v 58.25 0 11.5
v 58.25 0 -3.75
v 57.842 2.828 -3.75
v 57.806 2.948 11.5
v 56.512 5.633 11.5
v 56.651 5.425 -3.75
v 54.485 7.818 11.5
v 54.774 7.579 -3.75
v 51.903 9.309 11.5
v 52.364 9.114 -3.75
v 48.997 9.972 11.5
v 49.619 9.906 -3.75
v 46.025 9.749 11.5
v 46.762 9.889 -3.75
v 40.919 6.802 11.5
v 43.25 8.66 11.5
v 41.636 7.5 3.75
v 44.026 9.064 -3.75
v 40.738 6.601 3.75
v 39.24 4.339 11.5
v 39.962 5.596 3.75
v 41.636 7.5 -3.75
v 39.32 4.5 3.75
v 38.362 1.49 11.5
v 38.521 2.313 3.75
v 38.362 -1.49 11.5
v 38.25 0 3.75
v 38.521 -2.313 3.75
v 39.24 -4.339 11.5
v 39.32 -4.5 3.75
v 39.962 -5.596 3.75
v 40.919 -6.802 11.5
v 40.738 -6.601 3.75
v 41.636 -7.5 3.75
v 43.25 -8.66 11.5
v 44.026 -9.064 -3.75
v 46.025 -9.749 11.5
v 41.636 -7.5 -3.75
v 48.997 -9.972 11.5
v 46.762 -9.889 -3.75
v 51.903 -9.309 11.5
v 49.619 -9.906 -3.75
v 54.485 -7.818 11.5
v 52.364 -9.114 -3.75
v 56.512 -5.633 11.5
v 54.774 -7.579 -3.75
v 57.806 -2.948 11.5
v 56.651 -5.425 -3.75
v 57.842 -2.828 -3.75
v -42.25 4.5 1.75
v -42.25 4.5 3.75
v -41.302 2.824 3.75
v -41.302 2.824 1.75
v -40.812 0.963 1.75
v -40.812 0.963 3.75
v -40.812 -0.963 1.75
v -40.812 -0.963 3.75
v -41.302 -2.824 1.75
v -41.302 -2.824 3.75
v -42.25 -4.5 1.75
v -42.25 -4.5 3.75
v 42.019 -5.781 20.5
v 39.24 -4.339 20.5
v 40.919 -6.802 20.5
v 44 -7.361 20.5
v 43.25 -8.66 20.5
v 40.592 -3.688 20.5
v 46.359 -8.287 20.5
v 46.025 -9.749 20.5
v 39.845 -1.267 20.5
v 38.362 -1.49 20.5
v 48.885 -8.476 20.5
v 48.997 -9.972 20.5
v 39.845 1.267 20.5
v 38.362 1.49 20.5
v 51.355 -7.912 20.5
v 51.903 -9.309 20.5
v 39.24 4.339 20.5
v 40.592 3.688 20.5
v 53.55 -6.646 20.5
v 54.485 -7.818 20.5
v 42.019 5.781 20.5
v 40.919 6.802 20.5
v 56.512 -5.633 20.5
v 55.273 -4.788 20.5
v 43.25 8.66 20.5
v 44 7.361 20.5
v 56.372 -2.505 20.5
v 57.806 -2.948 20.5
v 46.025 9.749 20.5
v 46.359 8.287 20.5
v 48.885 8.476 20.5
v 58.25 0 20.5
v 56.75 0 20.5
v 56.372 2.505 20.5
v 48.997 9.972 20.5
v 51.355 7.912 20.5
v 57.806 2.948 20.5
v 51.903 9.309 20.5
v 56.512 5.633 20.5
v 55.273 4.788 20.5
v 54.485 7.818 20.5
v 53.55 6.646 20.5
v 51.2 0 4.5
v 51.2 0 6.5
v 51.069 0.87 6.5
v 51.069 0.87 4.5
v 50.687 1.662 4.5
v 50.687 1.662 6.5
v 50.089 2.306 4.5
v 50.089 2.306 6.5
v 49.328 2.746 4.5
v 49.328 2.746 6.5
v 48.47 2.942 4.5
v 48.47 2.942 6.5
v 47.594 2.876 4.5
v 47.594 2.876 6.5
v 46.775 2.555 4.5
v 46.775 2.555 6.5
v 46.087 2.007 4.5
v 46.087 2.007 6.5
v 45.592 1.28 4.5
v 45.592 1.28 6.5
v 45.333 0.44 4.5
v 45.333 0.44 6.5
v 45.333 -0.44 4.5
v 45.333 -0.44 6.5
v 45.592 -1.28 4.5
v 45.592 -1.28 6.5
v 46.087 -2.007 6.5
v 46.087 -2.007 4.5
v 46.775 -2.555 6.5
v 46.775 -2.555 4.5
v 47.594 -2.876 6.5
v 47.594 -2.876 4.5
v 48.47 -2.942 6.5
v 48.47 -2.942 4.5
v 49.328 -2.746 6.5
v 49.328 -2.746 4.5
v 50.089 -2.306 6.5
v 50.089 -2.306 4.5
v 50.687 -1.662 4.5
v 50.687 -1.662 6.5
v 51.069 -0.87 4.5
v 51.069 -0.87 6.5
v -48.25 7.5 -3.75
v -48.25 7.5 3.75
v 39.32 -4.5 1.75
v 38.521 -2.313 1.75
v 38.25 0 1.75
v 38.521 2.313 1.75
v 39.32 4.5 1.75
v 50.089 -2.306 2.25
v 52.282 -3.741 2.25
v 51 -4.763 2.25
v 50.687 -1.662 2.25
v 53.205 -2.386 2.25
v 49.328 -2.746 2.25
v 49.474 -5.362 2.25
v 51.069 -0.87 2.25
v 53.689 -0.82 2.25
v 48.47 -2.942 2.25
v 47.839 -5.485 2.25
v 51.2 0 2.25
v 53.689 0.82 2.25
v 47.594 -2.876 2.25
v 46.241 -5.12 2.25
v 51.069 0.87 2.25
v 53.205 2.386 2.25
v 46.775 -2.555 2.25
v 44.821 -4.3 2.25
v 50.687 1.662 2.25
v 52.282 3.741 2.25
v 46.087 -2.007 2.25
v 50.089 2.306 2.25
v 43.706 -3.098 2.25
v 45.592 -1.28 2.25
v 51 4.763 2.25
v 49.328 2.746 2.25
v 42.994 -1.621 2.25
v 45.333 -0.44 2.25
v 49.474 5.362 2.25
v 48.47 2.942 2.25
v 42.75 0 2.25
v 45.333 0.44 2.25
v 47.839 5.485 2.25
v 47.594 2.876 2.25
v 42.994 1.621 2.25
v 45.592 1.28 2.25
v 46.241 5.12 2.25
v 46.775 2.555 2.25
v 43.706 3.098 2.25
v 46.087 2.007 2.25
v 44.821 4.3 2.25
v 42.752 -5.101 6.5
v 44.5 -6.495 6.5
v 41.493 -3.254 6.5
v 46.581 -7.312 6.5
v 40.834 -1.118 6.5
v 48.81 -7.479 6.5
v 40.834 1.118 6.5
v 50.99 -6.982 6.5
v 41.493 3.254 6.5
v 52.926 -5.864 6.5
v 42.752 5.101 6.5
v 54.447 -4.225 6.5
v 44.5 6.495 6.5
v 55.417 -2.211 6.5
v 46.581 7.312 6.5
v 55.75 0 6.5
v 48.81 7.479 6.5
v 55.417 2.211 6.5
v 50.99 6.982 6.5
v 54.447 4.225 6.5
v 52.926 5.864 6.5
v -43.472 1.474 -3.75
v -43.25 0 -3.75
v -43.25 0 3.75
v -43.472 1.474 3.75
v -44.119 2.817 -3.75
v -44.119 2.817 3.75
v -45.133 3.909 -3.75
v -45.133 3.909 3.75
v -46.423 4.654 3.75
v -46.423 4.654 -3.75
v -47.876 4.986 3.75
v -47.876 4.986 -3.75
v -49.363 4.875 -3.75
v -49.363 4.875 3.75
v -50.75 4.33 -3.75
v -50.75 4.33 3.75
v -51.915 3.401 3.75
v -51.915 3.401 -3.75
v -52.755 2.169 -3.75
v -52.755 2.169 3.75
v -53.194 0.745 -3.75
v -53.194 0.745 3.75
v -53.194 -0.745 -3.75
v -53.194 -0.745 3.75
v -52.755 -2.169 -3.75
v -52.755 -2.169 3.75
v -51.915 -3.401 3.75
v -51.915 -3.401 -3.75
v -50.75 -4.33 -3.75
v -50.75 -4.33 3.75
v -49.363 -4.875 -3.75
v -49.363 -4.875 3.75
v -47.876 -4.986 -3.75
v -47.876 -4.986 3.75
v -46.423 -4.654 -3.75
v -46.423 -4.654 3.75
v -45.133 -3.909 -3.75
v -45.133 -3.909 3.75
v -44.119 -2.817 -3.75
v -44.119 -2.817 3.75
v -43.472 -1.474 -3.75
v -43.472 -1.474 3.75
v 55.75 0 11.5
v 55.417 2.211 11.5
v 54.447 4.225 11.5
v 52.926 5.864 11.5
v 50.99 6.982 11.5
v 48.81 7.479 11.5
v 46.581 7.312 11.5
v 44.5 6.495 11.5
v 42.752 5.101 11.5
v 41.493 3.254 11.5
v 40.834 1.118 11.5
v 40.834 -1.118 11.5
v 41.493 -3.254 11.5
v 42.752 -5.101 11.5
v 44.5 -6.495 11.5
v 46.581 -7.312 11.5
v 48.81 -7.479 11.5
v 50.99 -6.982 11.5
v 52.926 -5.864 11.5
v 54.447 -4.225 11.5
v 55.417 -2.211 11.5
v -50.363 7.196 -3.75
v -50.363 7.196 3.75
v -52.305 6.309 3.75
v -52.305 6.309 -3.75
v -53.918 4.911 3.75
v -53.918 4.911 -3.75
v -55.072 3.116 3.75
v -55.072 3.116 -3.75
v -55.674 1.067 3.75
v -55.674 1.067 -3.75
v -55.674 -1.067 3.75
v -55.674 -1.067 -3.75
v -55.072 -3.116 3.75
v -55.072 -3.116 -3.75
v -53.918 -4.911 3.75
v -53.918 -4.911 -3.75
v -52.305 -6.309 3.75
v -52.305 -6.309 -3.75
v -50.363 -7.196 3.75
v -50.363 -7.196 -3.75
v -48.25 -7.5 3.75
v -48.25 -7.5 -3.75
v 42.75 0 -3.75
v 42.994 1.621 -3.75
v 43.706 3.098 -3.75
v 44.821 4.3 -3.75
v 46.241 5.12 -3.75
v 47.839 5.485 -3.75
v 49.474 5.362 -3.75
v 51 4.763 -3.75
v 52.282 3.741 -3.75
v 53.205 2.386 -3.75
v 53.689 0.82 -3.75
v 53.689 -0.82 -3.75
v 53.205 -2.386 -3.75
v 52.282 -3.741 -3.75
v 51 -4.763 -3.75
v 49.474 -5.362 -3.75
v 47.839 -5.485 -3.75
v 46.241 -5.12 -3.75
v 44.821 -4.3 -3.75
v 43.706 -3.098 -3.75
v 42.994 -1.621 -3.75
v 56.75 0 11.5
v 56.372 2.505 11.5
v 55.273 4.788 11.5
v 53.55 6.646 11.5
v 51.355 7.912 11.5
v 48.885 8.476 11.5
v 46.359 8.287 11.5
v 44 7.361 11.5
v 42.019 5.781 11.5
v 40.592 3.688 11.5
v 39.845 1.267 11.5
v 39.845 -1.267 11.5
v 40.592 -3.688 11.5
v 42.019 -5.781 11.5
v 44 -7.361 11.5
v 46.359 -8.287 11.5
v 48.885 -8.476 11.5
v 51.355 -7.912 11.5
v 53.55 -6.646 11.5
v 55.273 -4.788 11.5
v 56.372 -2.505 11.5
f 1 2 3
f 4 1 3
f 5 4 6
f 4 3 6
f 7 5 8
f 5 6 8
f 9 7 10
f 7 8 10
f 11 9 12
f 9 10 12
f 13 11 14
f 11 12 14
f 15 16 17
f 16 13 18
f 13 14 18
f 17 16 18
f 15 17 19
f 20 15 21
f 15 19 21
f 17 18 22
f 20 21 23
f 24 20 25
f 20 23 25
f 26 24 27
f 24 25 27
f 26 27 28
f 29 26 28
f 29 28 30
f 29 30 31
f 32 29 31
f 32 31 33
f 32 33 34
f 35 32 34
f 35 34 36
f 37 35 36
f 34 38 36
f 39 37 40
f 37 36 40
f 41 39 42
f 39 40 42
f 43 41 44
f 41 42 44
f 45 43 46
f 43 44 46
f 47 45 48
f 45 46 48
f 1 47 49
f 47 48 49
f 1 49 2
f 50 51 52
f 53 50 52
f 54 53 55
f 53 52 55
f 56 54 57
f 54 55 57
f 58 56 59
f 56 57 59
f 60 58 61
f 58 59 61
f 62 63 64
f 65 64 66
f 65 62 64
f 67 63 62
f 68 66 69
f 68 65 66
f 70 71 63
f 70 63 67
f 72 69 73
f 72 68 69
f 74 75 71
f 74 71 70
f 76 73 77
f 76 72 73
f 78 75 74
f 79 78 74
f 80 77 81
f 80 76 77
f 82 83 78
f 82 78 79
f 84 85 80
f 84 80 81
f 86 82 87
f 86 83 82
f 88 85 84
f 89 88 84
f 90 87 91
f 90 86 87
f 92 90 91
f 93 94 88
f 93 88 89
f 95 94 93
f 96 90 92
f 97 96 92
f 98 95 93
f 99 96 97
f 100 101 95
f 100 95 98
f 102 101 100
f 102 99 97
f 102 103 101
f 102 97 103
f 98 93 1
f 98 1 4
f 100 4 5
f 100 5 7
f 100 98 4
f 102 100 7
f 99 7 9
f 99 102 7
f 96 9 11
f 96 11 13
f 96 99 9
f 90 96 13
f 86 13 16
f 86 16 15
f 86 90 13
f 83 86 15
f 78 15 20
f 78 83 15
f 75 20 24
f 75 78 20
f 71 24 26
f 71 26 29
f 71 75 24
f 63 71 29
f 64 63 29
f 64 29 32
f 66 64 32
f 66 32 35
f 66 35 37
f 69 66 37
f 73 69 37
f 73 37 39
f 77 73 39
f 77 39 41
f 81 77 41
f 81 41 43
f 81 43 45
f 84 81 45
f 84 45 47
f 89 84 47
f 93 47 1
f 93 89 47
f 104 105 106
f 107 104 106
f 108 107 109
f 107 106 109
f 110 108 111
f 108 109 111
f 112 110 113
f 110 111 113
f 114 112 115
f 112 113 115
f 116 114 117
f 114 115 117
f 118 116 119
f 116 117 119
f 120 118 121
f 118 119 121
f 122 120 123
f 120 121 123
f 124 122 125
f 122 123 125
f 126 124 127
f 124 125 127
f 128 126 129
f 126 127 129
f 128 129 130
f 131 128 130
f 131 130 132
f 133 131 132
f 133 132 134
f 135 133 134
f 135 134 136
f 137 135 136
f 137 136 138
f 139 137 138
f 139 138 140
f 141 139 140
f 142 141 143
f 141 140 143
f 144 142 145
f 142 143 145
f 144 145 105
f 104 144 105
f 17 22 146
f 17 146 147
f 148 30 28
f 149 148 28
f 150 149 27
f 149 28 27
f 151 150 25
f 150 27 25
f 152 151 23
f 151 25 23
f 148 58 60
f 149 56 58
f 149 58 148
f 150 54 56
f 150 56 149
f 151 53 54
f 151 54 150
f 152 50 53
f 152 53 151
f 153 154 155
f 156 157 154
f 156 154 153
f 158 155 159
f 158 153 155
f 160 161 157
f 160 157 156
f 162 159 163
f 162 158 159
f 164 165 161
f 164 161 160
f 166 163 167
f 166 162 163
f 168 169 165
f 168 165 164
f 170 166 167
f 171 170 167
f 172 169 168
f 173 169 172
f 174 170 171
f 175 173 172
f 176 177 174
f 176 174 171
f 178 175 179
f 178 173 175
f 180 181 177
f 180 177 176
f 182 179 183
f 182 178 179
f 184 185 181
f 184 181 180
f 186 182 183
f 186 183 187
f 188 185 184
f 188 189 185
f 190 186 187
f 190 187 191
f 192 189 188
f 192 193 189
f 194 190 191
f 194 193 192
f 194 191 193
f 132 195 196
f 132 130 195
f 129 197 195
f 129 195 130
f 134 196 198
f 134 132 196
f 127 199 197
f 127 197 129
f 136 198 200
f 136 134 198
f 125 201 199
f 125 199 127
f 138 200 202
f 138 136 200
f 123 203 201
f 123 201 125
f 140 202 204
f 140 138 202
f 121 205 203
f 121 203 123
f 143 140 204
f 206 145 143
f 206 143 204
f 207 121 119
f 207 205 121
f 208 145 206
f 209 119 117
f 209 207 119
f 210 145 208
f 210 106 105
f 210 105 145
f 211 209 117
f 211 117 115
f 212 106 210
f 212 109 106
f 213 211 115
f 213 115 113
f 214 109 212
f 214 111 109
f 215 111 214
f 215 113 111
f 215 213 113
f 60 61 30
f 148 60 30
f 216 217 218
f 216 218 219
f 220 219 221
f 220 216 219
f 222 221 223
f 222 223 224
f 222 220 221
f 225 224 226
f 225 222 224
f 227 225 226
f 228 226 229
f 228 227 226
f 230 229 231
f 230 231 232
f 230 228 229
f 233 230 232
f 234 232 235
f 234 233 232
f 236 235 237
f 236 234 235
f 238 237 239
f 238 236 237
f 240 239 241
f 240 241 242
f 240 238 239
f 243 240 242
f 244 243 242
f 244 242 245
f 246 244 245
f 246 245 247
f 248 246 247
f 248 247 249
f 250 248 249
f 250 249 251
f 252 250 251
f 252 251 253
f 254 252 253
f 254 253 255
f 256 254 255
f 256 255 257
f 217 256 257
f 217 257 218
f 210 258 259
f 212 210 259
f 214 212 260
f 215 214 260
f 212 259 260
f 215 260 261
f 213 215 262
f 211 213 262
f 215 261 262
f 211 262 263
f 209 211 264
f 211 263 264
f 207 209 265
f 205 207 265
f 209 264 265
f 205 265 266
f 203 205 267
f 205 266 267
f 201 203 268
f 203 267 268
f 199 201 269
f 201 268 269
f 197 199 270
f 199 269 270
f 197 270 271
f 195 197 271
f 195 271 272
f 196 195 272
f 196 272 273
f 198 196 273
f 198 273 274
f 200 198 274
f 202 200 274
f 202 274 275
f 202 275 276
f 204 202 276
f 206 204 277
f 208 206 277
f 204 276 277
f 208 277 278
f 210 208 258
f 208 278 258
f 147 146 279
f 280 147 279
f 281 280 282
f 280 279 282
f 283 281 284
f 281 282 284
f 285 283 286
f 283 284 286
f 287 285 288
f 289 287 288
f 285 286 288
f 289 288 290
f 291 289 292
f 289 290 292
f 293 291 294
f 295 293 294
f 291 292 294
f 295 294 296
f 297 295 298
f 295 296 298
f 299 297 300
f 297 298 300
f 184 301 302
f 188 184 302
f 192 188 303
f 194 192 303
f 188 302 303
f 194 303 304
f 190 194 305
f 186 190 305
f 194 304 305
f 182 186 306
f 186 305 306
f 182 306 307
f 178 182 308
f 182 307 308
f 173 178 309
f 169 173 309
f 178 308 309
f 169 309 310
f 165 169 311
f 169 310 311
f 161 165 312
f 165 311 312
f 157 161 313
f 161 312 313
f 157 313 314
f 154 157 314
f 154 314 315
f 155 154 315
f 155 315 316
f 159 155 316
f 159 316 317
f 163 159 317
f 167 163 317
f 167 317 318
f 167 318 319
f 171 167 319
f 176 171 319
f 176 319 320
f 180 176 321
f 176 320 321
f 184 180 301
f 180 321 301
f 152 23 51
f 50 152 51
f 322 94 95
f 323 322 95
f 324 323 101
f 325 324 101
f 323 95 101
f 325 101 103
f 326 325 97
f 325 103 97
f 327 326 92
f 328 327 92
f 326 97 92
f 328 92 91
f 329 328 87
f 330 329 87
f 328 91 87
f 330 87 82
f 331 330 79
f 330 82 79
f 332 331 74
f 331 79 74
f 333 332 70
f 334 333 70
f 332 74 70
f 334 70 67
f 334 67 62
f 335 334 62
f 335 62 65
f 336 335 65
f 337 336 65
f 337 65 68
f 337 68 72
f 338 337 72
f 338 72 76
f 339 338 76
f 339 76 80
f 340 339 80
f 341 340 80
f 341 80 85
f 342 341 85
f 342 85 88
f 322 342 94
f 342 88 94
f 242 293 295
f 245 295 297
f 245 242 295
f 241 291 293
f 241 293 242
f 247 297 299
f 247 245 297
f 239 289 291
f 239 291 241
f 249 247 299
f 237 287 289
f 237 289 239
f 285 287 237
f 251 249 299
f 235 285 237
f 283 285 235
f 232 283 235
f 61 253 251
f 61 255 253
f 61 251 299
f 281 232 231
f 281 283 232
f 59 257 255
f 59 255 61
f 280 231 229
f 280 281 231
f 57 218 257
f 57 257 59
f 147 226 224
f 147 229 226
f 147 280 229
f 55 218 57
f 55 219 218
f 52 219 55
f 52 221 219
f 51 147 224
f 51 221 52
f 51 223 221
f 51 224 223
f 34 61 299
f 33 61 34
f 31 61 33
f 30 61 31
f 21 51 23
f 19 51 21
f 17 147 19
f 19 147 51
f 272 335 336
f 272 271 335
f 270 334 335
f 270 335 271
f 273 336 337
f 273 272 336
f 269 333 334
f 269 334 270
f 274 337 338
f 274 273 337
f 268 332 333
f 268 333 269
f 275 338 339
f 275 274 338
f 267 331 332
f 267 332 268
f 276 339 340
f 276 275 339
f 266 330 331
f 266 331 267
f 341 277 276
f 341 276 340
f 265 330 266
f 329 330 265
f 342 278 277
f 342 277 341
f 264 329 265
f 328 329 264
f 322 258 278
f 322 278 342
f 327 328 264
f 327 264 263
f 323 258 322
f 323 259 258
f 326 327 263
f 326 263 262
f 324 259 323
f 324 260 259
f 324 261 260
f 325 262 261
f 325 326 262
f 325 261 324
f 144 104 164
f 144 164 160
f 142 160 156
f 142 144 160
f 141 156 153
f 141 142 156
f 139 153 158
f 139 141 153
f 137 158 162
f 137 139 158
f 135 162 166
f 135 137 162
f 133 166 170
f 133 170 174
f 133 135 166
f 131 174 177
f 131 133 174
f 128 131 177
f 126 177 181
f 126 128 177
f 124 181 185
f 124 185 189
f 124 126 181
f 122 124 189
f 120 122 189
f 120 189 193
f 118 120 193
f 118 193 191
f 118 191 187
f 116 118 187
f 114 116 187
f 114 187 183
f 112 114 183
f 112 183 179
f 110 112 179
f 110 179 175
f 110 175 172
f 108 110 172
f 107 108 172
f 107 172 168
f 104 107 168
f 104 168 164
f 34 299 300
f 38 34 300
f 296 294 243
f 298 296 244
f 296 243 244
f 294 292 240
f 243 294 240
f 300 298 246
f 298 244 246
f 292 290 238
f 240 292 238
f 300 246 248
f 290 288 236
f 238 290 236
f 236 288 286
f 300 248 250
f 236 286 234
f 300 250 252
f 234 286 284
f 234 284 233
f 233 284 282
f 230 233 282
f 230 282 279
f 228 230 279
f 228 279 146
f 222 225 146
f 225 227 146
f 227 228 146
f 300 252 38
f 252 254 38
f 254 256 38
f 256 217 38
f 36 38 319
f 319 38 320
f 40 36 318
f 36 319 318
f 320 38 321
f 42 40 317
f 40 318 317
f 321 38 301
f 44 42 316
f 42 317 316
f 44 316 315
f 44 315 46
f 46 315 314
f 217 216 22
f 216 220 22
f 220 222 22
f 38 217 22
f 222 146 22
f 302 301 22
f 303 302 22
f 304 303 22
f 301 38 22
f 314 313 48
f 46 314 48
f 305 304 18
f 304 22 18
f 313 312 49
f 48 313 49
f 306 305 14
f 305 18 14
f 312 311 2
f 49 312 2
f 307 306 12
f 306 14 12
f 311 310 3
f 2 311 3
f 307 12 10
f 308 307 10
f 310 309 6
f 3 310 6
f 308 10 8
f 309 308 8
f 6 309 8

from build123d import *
from build123d.topology import SkipClean

# Parameters (mm, degrees)
EXTRUDE_1_DEPTH          = 48.25
EXTRUDE_1_DEPTH_BACK     = 48.25
EXTRUDE_2_DEPTH          = 3.75
EXTRUDE_2_DEPTH_BACK     = 3.75
SKETCH_2_R               = 7.5
SKETCH_2_R_2             = 5
CUT_EXTRUDE_1_DEPTH      = 3.75
CUT_EXTRUDE_1_DEPTH_BACK = 3.75
SKETCH_3_R               = 5
EXTRUDE_3_DEPTH          = 11.5
EXTRUDE_3_DEPTH_BACK     = 3.75
SKETCH_4_R               = 10
CUT_EXTRUDE_4_DEPTH      = 2
SKETCH_9_R               = 7.5
CUT_EXTRUDE_5_DEPTH      = 5
EXTRUDE_START            = 9
SKETCH_10_R              = 10
SKETCH_10_R_2            = 8.5
EXTRUDE_5_DEPTH          = 9
SKETCH_11_R              = 2.95
CUT_EXTRUDE_6_DEPTH      = 2
SKETCH_12_R              = 5.5
CUT_EXTRUDE_7_DEPTH      = 6
CUT_EXTRUDE_START        = -6
SKETCH_13_R              = 2.95
CUT_EXTRUDE_8_DEPTH      = 6


with BuildPart() as part:
    # 草图1 → 凸台-拉伸1 (new, two sides: drawn at the far end of the back side and taken through both)
    with BuildSketch(Plane(origin=(0, 0, 0), x_dir=(0, 0, -1), z_dir=(1, 0, 0)).offset(-EXTRUDE_1_DEPTH_BACK)):
        Polygon((3.75, 0), (3.75, 7.5), (-3.75, 7.5), (-3.75, -7.5), (3.75, -7.5), align=None)
    extrude(amount=EXTRUDE_1_DEPTH + EXTRUDE_1_DEPTH_BACK)

    # 草图2 → 凸台-拉伸2 (add, two sides: drawn at the far end of the back side and taken through both)
    with BuildSketch(Plane.XY.offset(-EXTRUDE_2_DEPTH_BACK)):
        with Locations((-48.25, 0)):
            Circle(SKETCH_2_R)
        with Locations((-48.25, 0)):
            Circle(SKETCH_2_R_2, mode=Mode.SUBTRACT)
    extrude(amount=EXTRUDE_2_DEPTH + EXTRUDE_2_DEPTH_BACK)

    # 草图3 → 切除-拉伸1 (cut, two sides: drawn at the far end of the back side and taken through both)
    with BuildSketch(Plane.XY.offset(-CUT_EXTRUDE_1_DEPTH_BACK)):
        with Locations((-48.25, 0)):
            Circle(SKETCH_3_R)
    extrude(amount=CUT_EXTRUDE_1_DEPTH + CUT_EXTRUDE_1_DEPTH_BACK, mode=Mode.SUBTRACT)

    # 草图4 → 凸台-拉伸3 (add, two sides: drawn at the far end of the back side and taken through both)
    with BuildSketch(Plane.XY.offset(-EXTRUDE_3_DEPTH_BACK)):
        with Locations((48.25, 0)):
            Circle(SKETCH_4_R)
    extrude(amount=EXTRUDE_3_DEPTH + EXTRUDE_3_DEPTH_BACK)

    # 草图8 → 切除-拉伸4 (cut)
    with BuildSketch(Plane.XY.offset(3.75)):
        with BuildLine():
            Line((0, 4.5), (-42.25, 4.5))
            ThreePointArc((-42.25, 4.5), (-40.75, 0), (-42.25, -4.5))
            Line((-42.25, -4.5), (0, -4.5))
            Line((0, -4.5), (39.31971445, -4.5))
            ThreePointArc((39.31971445, -4.5), (38.25, 0), (39.31971445, 4.5))
            Line((39.31971445, 4.5), (0, 4.5))
        make_face()
    extrude(amount=-CUT_EXTRUDE_4_DEPTH, mode=Mode.SUBTRACT)

    # 草图9 → 切除-拉伸5 (cut)
    with BuildSketch(Plane.XY.offset(11.5)):
        with Locations((48.25, 0)):
            Circle(SKETCH_9_R)
    extrude(amount=-CUT_EXTRUDE_5_DEPTH, mode=Mode.SUBTRACT)

    # 草图10 → 凸台-拉伸5 (add)
    with SkipClean():  # the faces are left unmerged after this step: merging them gives an invalid solid
        with BuildSketch(Plane.XY.offset(11.5).offset(EXTRUDE_START)):
            with Locations((48.25, 0)):
                Circle(SKETCH_10_R)
            with Locations((48.25, 0)):
                Circle(SKETCH_10_R_2, mode=Mode.SUBTRACT)
        extrude(amount=-EXTRUDE_5_DEPTH)

    # 草图11 → 切除-拉伸6 (cut)
    with SkipClean():  # the faces are left unmerged after this step: merging them gives an invalid solid
        with BuildSketch(Plane.XY.offset(6.5)):
            with Locations((48.25, 0)):
                Circle(SKETCH_11_R)
        extrude(amount=-CUT_EXTRUDE_6_DEPTH, mode=Mode.SUBTRACT)

    # 草图12 → 切除-拉伸7 (cut)
    with SkipClean():  # the faces are left unmerged after this step: merging them gives an invalid solid
        with BuildSketch(Plane(origin=(0, 0, -3.75), x_dir=(-1, 0, 0), z_dir=(0, 0, -1))):
            with Locations((-48.25, 0)):
                Circle(SKETCH_12_R)
        extrude(amount=-CUT_EXTRUDE_7_DEPTH, mode=Mode.SUBTRACT)

    # 草图13 → 切除-拉伸8 (cut)
    with SkipClean():  # the faces are left unmerged after this step: merging them gives an invalid solid
        with BuildSketch(Plane(origin=(0, 0, 2.25), x_dir=(-1, 0, 0), z_dir=(0, 0, -1)).offset(CUT_EXTRUDE_START)):
            with Locations((-48.25, 0)):
                Circle(SKETCH_13_R)
        extrude(amount=CUT_EXTRUDE_8_DEPTH, mode=Mode.SUBTRACT)


solid = part.part
